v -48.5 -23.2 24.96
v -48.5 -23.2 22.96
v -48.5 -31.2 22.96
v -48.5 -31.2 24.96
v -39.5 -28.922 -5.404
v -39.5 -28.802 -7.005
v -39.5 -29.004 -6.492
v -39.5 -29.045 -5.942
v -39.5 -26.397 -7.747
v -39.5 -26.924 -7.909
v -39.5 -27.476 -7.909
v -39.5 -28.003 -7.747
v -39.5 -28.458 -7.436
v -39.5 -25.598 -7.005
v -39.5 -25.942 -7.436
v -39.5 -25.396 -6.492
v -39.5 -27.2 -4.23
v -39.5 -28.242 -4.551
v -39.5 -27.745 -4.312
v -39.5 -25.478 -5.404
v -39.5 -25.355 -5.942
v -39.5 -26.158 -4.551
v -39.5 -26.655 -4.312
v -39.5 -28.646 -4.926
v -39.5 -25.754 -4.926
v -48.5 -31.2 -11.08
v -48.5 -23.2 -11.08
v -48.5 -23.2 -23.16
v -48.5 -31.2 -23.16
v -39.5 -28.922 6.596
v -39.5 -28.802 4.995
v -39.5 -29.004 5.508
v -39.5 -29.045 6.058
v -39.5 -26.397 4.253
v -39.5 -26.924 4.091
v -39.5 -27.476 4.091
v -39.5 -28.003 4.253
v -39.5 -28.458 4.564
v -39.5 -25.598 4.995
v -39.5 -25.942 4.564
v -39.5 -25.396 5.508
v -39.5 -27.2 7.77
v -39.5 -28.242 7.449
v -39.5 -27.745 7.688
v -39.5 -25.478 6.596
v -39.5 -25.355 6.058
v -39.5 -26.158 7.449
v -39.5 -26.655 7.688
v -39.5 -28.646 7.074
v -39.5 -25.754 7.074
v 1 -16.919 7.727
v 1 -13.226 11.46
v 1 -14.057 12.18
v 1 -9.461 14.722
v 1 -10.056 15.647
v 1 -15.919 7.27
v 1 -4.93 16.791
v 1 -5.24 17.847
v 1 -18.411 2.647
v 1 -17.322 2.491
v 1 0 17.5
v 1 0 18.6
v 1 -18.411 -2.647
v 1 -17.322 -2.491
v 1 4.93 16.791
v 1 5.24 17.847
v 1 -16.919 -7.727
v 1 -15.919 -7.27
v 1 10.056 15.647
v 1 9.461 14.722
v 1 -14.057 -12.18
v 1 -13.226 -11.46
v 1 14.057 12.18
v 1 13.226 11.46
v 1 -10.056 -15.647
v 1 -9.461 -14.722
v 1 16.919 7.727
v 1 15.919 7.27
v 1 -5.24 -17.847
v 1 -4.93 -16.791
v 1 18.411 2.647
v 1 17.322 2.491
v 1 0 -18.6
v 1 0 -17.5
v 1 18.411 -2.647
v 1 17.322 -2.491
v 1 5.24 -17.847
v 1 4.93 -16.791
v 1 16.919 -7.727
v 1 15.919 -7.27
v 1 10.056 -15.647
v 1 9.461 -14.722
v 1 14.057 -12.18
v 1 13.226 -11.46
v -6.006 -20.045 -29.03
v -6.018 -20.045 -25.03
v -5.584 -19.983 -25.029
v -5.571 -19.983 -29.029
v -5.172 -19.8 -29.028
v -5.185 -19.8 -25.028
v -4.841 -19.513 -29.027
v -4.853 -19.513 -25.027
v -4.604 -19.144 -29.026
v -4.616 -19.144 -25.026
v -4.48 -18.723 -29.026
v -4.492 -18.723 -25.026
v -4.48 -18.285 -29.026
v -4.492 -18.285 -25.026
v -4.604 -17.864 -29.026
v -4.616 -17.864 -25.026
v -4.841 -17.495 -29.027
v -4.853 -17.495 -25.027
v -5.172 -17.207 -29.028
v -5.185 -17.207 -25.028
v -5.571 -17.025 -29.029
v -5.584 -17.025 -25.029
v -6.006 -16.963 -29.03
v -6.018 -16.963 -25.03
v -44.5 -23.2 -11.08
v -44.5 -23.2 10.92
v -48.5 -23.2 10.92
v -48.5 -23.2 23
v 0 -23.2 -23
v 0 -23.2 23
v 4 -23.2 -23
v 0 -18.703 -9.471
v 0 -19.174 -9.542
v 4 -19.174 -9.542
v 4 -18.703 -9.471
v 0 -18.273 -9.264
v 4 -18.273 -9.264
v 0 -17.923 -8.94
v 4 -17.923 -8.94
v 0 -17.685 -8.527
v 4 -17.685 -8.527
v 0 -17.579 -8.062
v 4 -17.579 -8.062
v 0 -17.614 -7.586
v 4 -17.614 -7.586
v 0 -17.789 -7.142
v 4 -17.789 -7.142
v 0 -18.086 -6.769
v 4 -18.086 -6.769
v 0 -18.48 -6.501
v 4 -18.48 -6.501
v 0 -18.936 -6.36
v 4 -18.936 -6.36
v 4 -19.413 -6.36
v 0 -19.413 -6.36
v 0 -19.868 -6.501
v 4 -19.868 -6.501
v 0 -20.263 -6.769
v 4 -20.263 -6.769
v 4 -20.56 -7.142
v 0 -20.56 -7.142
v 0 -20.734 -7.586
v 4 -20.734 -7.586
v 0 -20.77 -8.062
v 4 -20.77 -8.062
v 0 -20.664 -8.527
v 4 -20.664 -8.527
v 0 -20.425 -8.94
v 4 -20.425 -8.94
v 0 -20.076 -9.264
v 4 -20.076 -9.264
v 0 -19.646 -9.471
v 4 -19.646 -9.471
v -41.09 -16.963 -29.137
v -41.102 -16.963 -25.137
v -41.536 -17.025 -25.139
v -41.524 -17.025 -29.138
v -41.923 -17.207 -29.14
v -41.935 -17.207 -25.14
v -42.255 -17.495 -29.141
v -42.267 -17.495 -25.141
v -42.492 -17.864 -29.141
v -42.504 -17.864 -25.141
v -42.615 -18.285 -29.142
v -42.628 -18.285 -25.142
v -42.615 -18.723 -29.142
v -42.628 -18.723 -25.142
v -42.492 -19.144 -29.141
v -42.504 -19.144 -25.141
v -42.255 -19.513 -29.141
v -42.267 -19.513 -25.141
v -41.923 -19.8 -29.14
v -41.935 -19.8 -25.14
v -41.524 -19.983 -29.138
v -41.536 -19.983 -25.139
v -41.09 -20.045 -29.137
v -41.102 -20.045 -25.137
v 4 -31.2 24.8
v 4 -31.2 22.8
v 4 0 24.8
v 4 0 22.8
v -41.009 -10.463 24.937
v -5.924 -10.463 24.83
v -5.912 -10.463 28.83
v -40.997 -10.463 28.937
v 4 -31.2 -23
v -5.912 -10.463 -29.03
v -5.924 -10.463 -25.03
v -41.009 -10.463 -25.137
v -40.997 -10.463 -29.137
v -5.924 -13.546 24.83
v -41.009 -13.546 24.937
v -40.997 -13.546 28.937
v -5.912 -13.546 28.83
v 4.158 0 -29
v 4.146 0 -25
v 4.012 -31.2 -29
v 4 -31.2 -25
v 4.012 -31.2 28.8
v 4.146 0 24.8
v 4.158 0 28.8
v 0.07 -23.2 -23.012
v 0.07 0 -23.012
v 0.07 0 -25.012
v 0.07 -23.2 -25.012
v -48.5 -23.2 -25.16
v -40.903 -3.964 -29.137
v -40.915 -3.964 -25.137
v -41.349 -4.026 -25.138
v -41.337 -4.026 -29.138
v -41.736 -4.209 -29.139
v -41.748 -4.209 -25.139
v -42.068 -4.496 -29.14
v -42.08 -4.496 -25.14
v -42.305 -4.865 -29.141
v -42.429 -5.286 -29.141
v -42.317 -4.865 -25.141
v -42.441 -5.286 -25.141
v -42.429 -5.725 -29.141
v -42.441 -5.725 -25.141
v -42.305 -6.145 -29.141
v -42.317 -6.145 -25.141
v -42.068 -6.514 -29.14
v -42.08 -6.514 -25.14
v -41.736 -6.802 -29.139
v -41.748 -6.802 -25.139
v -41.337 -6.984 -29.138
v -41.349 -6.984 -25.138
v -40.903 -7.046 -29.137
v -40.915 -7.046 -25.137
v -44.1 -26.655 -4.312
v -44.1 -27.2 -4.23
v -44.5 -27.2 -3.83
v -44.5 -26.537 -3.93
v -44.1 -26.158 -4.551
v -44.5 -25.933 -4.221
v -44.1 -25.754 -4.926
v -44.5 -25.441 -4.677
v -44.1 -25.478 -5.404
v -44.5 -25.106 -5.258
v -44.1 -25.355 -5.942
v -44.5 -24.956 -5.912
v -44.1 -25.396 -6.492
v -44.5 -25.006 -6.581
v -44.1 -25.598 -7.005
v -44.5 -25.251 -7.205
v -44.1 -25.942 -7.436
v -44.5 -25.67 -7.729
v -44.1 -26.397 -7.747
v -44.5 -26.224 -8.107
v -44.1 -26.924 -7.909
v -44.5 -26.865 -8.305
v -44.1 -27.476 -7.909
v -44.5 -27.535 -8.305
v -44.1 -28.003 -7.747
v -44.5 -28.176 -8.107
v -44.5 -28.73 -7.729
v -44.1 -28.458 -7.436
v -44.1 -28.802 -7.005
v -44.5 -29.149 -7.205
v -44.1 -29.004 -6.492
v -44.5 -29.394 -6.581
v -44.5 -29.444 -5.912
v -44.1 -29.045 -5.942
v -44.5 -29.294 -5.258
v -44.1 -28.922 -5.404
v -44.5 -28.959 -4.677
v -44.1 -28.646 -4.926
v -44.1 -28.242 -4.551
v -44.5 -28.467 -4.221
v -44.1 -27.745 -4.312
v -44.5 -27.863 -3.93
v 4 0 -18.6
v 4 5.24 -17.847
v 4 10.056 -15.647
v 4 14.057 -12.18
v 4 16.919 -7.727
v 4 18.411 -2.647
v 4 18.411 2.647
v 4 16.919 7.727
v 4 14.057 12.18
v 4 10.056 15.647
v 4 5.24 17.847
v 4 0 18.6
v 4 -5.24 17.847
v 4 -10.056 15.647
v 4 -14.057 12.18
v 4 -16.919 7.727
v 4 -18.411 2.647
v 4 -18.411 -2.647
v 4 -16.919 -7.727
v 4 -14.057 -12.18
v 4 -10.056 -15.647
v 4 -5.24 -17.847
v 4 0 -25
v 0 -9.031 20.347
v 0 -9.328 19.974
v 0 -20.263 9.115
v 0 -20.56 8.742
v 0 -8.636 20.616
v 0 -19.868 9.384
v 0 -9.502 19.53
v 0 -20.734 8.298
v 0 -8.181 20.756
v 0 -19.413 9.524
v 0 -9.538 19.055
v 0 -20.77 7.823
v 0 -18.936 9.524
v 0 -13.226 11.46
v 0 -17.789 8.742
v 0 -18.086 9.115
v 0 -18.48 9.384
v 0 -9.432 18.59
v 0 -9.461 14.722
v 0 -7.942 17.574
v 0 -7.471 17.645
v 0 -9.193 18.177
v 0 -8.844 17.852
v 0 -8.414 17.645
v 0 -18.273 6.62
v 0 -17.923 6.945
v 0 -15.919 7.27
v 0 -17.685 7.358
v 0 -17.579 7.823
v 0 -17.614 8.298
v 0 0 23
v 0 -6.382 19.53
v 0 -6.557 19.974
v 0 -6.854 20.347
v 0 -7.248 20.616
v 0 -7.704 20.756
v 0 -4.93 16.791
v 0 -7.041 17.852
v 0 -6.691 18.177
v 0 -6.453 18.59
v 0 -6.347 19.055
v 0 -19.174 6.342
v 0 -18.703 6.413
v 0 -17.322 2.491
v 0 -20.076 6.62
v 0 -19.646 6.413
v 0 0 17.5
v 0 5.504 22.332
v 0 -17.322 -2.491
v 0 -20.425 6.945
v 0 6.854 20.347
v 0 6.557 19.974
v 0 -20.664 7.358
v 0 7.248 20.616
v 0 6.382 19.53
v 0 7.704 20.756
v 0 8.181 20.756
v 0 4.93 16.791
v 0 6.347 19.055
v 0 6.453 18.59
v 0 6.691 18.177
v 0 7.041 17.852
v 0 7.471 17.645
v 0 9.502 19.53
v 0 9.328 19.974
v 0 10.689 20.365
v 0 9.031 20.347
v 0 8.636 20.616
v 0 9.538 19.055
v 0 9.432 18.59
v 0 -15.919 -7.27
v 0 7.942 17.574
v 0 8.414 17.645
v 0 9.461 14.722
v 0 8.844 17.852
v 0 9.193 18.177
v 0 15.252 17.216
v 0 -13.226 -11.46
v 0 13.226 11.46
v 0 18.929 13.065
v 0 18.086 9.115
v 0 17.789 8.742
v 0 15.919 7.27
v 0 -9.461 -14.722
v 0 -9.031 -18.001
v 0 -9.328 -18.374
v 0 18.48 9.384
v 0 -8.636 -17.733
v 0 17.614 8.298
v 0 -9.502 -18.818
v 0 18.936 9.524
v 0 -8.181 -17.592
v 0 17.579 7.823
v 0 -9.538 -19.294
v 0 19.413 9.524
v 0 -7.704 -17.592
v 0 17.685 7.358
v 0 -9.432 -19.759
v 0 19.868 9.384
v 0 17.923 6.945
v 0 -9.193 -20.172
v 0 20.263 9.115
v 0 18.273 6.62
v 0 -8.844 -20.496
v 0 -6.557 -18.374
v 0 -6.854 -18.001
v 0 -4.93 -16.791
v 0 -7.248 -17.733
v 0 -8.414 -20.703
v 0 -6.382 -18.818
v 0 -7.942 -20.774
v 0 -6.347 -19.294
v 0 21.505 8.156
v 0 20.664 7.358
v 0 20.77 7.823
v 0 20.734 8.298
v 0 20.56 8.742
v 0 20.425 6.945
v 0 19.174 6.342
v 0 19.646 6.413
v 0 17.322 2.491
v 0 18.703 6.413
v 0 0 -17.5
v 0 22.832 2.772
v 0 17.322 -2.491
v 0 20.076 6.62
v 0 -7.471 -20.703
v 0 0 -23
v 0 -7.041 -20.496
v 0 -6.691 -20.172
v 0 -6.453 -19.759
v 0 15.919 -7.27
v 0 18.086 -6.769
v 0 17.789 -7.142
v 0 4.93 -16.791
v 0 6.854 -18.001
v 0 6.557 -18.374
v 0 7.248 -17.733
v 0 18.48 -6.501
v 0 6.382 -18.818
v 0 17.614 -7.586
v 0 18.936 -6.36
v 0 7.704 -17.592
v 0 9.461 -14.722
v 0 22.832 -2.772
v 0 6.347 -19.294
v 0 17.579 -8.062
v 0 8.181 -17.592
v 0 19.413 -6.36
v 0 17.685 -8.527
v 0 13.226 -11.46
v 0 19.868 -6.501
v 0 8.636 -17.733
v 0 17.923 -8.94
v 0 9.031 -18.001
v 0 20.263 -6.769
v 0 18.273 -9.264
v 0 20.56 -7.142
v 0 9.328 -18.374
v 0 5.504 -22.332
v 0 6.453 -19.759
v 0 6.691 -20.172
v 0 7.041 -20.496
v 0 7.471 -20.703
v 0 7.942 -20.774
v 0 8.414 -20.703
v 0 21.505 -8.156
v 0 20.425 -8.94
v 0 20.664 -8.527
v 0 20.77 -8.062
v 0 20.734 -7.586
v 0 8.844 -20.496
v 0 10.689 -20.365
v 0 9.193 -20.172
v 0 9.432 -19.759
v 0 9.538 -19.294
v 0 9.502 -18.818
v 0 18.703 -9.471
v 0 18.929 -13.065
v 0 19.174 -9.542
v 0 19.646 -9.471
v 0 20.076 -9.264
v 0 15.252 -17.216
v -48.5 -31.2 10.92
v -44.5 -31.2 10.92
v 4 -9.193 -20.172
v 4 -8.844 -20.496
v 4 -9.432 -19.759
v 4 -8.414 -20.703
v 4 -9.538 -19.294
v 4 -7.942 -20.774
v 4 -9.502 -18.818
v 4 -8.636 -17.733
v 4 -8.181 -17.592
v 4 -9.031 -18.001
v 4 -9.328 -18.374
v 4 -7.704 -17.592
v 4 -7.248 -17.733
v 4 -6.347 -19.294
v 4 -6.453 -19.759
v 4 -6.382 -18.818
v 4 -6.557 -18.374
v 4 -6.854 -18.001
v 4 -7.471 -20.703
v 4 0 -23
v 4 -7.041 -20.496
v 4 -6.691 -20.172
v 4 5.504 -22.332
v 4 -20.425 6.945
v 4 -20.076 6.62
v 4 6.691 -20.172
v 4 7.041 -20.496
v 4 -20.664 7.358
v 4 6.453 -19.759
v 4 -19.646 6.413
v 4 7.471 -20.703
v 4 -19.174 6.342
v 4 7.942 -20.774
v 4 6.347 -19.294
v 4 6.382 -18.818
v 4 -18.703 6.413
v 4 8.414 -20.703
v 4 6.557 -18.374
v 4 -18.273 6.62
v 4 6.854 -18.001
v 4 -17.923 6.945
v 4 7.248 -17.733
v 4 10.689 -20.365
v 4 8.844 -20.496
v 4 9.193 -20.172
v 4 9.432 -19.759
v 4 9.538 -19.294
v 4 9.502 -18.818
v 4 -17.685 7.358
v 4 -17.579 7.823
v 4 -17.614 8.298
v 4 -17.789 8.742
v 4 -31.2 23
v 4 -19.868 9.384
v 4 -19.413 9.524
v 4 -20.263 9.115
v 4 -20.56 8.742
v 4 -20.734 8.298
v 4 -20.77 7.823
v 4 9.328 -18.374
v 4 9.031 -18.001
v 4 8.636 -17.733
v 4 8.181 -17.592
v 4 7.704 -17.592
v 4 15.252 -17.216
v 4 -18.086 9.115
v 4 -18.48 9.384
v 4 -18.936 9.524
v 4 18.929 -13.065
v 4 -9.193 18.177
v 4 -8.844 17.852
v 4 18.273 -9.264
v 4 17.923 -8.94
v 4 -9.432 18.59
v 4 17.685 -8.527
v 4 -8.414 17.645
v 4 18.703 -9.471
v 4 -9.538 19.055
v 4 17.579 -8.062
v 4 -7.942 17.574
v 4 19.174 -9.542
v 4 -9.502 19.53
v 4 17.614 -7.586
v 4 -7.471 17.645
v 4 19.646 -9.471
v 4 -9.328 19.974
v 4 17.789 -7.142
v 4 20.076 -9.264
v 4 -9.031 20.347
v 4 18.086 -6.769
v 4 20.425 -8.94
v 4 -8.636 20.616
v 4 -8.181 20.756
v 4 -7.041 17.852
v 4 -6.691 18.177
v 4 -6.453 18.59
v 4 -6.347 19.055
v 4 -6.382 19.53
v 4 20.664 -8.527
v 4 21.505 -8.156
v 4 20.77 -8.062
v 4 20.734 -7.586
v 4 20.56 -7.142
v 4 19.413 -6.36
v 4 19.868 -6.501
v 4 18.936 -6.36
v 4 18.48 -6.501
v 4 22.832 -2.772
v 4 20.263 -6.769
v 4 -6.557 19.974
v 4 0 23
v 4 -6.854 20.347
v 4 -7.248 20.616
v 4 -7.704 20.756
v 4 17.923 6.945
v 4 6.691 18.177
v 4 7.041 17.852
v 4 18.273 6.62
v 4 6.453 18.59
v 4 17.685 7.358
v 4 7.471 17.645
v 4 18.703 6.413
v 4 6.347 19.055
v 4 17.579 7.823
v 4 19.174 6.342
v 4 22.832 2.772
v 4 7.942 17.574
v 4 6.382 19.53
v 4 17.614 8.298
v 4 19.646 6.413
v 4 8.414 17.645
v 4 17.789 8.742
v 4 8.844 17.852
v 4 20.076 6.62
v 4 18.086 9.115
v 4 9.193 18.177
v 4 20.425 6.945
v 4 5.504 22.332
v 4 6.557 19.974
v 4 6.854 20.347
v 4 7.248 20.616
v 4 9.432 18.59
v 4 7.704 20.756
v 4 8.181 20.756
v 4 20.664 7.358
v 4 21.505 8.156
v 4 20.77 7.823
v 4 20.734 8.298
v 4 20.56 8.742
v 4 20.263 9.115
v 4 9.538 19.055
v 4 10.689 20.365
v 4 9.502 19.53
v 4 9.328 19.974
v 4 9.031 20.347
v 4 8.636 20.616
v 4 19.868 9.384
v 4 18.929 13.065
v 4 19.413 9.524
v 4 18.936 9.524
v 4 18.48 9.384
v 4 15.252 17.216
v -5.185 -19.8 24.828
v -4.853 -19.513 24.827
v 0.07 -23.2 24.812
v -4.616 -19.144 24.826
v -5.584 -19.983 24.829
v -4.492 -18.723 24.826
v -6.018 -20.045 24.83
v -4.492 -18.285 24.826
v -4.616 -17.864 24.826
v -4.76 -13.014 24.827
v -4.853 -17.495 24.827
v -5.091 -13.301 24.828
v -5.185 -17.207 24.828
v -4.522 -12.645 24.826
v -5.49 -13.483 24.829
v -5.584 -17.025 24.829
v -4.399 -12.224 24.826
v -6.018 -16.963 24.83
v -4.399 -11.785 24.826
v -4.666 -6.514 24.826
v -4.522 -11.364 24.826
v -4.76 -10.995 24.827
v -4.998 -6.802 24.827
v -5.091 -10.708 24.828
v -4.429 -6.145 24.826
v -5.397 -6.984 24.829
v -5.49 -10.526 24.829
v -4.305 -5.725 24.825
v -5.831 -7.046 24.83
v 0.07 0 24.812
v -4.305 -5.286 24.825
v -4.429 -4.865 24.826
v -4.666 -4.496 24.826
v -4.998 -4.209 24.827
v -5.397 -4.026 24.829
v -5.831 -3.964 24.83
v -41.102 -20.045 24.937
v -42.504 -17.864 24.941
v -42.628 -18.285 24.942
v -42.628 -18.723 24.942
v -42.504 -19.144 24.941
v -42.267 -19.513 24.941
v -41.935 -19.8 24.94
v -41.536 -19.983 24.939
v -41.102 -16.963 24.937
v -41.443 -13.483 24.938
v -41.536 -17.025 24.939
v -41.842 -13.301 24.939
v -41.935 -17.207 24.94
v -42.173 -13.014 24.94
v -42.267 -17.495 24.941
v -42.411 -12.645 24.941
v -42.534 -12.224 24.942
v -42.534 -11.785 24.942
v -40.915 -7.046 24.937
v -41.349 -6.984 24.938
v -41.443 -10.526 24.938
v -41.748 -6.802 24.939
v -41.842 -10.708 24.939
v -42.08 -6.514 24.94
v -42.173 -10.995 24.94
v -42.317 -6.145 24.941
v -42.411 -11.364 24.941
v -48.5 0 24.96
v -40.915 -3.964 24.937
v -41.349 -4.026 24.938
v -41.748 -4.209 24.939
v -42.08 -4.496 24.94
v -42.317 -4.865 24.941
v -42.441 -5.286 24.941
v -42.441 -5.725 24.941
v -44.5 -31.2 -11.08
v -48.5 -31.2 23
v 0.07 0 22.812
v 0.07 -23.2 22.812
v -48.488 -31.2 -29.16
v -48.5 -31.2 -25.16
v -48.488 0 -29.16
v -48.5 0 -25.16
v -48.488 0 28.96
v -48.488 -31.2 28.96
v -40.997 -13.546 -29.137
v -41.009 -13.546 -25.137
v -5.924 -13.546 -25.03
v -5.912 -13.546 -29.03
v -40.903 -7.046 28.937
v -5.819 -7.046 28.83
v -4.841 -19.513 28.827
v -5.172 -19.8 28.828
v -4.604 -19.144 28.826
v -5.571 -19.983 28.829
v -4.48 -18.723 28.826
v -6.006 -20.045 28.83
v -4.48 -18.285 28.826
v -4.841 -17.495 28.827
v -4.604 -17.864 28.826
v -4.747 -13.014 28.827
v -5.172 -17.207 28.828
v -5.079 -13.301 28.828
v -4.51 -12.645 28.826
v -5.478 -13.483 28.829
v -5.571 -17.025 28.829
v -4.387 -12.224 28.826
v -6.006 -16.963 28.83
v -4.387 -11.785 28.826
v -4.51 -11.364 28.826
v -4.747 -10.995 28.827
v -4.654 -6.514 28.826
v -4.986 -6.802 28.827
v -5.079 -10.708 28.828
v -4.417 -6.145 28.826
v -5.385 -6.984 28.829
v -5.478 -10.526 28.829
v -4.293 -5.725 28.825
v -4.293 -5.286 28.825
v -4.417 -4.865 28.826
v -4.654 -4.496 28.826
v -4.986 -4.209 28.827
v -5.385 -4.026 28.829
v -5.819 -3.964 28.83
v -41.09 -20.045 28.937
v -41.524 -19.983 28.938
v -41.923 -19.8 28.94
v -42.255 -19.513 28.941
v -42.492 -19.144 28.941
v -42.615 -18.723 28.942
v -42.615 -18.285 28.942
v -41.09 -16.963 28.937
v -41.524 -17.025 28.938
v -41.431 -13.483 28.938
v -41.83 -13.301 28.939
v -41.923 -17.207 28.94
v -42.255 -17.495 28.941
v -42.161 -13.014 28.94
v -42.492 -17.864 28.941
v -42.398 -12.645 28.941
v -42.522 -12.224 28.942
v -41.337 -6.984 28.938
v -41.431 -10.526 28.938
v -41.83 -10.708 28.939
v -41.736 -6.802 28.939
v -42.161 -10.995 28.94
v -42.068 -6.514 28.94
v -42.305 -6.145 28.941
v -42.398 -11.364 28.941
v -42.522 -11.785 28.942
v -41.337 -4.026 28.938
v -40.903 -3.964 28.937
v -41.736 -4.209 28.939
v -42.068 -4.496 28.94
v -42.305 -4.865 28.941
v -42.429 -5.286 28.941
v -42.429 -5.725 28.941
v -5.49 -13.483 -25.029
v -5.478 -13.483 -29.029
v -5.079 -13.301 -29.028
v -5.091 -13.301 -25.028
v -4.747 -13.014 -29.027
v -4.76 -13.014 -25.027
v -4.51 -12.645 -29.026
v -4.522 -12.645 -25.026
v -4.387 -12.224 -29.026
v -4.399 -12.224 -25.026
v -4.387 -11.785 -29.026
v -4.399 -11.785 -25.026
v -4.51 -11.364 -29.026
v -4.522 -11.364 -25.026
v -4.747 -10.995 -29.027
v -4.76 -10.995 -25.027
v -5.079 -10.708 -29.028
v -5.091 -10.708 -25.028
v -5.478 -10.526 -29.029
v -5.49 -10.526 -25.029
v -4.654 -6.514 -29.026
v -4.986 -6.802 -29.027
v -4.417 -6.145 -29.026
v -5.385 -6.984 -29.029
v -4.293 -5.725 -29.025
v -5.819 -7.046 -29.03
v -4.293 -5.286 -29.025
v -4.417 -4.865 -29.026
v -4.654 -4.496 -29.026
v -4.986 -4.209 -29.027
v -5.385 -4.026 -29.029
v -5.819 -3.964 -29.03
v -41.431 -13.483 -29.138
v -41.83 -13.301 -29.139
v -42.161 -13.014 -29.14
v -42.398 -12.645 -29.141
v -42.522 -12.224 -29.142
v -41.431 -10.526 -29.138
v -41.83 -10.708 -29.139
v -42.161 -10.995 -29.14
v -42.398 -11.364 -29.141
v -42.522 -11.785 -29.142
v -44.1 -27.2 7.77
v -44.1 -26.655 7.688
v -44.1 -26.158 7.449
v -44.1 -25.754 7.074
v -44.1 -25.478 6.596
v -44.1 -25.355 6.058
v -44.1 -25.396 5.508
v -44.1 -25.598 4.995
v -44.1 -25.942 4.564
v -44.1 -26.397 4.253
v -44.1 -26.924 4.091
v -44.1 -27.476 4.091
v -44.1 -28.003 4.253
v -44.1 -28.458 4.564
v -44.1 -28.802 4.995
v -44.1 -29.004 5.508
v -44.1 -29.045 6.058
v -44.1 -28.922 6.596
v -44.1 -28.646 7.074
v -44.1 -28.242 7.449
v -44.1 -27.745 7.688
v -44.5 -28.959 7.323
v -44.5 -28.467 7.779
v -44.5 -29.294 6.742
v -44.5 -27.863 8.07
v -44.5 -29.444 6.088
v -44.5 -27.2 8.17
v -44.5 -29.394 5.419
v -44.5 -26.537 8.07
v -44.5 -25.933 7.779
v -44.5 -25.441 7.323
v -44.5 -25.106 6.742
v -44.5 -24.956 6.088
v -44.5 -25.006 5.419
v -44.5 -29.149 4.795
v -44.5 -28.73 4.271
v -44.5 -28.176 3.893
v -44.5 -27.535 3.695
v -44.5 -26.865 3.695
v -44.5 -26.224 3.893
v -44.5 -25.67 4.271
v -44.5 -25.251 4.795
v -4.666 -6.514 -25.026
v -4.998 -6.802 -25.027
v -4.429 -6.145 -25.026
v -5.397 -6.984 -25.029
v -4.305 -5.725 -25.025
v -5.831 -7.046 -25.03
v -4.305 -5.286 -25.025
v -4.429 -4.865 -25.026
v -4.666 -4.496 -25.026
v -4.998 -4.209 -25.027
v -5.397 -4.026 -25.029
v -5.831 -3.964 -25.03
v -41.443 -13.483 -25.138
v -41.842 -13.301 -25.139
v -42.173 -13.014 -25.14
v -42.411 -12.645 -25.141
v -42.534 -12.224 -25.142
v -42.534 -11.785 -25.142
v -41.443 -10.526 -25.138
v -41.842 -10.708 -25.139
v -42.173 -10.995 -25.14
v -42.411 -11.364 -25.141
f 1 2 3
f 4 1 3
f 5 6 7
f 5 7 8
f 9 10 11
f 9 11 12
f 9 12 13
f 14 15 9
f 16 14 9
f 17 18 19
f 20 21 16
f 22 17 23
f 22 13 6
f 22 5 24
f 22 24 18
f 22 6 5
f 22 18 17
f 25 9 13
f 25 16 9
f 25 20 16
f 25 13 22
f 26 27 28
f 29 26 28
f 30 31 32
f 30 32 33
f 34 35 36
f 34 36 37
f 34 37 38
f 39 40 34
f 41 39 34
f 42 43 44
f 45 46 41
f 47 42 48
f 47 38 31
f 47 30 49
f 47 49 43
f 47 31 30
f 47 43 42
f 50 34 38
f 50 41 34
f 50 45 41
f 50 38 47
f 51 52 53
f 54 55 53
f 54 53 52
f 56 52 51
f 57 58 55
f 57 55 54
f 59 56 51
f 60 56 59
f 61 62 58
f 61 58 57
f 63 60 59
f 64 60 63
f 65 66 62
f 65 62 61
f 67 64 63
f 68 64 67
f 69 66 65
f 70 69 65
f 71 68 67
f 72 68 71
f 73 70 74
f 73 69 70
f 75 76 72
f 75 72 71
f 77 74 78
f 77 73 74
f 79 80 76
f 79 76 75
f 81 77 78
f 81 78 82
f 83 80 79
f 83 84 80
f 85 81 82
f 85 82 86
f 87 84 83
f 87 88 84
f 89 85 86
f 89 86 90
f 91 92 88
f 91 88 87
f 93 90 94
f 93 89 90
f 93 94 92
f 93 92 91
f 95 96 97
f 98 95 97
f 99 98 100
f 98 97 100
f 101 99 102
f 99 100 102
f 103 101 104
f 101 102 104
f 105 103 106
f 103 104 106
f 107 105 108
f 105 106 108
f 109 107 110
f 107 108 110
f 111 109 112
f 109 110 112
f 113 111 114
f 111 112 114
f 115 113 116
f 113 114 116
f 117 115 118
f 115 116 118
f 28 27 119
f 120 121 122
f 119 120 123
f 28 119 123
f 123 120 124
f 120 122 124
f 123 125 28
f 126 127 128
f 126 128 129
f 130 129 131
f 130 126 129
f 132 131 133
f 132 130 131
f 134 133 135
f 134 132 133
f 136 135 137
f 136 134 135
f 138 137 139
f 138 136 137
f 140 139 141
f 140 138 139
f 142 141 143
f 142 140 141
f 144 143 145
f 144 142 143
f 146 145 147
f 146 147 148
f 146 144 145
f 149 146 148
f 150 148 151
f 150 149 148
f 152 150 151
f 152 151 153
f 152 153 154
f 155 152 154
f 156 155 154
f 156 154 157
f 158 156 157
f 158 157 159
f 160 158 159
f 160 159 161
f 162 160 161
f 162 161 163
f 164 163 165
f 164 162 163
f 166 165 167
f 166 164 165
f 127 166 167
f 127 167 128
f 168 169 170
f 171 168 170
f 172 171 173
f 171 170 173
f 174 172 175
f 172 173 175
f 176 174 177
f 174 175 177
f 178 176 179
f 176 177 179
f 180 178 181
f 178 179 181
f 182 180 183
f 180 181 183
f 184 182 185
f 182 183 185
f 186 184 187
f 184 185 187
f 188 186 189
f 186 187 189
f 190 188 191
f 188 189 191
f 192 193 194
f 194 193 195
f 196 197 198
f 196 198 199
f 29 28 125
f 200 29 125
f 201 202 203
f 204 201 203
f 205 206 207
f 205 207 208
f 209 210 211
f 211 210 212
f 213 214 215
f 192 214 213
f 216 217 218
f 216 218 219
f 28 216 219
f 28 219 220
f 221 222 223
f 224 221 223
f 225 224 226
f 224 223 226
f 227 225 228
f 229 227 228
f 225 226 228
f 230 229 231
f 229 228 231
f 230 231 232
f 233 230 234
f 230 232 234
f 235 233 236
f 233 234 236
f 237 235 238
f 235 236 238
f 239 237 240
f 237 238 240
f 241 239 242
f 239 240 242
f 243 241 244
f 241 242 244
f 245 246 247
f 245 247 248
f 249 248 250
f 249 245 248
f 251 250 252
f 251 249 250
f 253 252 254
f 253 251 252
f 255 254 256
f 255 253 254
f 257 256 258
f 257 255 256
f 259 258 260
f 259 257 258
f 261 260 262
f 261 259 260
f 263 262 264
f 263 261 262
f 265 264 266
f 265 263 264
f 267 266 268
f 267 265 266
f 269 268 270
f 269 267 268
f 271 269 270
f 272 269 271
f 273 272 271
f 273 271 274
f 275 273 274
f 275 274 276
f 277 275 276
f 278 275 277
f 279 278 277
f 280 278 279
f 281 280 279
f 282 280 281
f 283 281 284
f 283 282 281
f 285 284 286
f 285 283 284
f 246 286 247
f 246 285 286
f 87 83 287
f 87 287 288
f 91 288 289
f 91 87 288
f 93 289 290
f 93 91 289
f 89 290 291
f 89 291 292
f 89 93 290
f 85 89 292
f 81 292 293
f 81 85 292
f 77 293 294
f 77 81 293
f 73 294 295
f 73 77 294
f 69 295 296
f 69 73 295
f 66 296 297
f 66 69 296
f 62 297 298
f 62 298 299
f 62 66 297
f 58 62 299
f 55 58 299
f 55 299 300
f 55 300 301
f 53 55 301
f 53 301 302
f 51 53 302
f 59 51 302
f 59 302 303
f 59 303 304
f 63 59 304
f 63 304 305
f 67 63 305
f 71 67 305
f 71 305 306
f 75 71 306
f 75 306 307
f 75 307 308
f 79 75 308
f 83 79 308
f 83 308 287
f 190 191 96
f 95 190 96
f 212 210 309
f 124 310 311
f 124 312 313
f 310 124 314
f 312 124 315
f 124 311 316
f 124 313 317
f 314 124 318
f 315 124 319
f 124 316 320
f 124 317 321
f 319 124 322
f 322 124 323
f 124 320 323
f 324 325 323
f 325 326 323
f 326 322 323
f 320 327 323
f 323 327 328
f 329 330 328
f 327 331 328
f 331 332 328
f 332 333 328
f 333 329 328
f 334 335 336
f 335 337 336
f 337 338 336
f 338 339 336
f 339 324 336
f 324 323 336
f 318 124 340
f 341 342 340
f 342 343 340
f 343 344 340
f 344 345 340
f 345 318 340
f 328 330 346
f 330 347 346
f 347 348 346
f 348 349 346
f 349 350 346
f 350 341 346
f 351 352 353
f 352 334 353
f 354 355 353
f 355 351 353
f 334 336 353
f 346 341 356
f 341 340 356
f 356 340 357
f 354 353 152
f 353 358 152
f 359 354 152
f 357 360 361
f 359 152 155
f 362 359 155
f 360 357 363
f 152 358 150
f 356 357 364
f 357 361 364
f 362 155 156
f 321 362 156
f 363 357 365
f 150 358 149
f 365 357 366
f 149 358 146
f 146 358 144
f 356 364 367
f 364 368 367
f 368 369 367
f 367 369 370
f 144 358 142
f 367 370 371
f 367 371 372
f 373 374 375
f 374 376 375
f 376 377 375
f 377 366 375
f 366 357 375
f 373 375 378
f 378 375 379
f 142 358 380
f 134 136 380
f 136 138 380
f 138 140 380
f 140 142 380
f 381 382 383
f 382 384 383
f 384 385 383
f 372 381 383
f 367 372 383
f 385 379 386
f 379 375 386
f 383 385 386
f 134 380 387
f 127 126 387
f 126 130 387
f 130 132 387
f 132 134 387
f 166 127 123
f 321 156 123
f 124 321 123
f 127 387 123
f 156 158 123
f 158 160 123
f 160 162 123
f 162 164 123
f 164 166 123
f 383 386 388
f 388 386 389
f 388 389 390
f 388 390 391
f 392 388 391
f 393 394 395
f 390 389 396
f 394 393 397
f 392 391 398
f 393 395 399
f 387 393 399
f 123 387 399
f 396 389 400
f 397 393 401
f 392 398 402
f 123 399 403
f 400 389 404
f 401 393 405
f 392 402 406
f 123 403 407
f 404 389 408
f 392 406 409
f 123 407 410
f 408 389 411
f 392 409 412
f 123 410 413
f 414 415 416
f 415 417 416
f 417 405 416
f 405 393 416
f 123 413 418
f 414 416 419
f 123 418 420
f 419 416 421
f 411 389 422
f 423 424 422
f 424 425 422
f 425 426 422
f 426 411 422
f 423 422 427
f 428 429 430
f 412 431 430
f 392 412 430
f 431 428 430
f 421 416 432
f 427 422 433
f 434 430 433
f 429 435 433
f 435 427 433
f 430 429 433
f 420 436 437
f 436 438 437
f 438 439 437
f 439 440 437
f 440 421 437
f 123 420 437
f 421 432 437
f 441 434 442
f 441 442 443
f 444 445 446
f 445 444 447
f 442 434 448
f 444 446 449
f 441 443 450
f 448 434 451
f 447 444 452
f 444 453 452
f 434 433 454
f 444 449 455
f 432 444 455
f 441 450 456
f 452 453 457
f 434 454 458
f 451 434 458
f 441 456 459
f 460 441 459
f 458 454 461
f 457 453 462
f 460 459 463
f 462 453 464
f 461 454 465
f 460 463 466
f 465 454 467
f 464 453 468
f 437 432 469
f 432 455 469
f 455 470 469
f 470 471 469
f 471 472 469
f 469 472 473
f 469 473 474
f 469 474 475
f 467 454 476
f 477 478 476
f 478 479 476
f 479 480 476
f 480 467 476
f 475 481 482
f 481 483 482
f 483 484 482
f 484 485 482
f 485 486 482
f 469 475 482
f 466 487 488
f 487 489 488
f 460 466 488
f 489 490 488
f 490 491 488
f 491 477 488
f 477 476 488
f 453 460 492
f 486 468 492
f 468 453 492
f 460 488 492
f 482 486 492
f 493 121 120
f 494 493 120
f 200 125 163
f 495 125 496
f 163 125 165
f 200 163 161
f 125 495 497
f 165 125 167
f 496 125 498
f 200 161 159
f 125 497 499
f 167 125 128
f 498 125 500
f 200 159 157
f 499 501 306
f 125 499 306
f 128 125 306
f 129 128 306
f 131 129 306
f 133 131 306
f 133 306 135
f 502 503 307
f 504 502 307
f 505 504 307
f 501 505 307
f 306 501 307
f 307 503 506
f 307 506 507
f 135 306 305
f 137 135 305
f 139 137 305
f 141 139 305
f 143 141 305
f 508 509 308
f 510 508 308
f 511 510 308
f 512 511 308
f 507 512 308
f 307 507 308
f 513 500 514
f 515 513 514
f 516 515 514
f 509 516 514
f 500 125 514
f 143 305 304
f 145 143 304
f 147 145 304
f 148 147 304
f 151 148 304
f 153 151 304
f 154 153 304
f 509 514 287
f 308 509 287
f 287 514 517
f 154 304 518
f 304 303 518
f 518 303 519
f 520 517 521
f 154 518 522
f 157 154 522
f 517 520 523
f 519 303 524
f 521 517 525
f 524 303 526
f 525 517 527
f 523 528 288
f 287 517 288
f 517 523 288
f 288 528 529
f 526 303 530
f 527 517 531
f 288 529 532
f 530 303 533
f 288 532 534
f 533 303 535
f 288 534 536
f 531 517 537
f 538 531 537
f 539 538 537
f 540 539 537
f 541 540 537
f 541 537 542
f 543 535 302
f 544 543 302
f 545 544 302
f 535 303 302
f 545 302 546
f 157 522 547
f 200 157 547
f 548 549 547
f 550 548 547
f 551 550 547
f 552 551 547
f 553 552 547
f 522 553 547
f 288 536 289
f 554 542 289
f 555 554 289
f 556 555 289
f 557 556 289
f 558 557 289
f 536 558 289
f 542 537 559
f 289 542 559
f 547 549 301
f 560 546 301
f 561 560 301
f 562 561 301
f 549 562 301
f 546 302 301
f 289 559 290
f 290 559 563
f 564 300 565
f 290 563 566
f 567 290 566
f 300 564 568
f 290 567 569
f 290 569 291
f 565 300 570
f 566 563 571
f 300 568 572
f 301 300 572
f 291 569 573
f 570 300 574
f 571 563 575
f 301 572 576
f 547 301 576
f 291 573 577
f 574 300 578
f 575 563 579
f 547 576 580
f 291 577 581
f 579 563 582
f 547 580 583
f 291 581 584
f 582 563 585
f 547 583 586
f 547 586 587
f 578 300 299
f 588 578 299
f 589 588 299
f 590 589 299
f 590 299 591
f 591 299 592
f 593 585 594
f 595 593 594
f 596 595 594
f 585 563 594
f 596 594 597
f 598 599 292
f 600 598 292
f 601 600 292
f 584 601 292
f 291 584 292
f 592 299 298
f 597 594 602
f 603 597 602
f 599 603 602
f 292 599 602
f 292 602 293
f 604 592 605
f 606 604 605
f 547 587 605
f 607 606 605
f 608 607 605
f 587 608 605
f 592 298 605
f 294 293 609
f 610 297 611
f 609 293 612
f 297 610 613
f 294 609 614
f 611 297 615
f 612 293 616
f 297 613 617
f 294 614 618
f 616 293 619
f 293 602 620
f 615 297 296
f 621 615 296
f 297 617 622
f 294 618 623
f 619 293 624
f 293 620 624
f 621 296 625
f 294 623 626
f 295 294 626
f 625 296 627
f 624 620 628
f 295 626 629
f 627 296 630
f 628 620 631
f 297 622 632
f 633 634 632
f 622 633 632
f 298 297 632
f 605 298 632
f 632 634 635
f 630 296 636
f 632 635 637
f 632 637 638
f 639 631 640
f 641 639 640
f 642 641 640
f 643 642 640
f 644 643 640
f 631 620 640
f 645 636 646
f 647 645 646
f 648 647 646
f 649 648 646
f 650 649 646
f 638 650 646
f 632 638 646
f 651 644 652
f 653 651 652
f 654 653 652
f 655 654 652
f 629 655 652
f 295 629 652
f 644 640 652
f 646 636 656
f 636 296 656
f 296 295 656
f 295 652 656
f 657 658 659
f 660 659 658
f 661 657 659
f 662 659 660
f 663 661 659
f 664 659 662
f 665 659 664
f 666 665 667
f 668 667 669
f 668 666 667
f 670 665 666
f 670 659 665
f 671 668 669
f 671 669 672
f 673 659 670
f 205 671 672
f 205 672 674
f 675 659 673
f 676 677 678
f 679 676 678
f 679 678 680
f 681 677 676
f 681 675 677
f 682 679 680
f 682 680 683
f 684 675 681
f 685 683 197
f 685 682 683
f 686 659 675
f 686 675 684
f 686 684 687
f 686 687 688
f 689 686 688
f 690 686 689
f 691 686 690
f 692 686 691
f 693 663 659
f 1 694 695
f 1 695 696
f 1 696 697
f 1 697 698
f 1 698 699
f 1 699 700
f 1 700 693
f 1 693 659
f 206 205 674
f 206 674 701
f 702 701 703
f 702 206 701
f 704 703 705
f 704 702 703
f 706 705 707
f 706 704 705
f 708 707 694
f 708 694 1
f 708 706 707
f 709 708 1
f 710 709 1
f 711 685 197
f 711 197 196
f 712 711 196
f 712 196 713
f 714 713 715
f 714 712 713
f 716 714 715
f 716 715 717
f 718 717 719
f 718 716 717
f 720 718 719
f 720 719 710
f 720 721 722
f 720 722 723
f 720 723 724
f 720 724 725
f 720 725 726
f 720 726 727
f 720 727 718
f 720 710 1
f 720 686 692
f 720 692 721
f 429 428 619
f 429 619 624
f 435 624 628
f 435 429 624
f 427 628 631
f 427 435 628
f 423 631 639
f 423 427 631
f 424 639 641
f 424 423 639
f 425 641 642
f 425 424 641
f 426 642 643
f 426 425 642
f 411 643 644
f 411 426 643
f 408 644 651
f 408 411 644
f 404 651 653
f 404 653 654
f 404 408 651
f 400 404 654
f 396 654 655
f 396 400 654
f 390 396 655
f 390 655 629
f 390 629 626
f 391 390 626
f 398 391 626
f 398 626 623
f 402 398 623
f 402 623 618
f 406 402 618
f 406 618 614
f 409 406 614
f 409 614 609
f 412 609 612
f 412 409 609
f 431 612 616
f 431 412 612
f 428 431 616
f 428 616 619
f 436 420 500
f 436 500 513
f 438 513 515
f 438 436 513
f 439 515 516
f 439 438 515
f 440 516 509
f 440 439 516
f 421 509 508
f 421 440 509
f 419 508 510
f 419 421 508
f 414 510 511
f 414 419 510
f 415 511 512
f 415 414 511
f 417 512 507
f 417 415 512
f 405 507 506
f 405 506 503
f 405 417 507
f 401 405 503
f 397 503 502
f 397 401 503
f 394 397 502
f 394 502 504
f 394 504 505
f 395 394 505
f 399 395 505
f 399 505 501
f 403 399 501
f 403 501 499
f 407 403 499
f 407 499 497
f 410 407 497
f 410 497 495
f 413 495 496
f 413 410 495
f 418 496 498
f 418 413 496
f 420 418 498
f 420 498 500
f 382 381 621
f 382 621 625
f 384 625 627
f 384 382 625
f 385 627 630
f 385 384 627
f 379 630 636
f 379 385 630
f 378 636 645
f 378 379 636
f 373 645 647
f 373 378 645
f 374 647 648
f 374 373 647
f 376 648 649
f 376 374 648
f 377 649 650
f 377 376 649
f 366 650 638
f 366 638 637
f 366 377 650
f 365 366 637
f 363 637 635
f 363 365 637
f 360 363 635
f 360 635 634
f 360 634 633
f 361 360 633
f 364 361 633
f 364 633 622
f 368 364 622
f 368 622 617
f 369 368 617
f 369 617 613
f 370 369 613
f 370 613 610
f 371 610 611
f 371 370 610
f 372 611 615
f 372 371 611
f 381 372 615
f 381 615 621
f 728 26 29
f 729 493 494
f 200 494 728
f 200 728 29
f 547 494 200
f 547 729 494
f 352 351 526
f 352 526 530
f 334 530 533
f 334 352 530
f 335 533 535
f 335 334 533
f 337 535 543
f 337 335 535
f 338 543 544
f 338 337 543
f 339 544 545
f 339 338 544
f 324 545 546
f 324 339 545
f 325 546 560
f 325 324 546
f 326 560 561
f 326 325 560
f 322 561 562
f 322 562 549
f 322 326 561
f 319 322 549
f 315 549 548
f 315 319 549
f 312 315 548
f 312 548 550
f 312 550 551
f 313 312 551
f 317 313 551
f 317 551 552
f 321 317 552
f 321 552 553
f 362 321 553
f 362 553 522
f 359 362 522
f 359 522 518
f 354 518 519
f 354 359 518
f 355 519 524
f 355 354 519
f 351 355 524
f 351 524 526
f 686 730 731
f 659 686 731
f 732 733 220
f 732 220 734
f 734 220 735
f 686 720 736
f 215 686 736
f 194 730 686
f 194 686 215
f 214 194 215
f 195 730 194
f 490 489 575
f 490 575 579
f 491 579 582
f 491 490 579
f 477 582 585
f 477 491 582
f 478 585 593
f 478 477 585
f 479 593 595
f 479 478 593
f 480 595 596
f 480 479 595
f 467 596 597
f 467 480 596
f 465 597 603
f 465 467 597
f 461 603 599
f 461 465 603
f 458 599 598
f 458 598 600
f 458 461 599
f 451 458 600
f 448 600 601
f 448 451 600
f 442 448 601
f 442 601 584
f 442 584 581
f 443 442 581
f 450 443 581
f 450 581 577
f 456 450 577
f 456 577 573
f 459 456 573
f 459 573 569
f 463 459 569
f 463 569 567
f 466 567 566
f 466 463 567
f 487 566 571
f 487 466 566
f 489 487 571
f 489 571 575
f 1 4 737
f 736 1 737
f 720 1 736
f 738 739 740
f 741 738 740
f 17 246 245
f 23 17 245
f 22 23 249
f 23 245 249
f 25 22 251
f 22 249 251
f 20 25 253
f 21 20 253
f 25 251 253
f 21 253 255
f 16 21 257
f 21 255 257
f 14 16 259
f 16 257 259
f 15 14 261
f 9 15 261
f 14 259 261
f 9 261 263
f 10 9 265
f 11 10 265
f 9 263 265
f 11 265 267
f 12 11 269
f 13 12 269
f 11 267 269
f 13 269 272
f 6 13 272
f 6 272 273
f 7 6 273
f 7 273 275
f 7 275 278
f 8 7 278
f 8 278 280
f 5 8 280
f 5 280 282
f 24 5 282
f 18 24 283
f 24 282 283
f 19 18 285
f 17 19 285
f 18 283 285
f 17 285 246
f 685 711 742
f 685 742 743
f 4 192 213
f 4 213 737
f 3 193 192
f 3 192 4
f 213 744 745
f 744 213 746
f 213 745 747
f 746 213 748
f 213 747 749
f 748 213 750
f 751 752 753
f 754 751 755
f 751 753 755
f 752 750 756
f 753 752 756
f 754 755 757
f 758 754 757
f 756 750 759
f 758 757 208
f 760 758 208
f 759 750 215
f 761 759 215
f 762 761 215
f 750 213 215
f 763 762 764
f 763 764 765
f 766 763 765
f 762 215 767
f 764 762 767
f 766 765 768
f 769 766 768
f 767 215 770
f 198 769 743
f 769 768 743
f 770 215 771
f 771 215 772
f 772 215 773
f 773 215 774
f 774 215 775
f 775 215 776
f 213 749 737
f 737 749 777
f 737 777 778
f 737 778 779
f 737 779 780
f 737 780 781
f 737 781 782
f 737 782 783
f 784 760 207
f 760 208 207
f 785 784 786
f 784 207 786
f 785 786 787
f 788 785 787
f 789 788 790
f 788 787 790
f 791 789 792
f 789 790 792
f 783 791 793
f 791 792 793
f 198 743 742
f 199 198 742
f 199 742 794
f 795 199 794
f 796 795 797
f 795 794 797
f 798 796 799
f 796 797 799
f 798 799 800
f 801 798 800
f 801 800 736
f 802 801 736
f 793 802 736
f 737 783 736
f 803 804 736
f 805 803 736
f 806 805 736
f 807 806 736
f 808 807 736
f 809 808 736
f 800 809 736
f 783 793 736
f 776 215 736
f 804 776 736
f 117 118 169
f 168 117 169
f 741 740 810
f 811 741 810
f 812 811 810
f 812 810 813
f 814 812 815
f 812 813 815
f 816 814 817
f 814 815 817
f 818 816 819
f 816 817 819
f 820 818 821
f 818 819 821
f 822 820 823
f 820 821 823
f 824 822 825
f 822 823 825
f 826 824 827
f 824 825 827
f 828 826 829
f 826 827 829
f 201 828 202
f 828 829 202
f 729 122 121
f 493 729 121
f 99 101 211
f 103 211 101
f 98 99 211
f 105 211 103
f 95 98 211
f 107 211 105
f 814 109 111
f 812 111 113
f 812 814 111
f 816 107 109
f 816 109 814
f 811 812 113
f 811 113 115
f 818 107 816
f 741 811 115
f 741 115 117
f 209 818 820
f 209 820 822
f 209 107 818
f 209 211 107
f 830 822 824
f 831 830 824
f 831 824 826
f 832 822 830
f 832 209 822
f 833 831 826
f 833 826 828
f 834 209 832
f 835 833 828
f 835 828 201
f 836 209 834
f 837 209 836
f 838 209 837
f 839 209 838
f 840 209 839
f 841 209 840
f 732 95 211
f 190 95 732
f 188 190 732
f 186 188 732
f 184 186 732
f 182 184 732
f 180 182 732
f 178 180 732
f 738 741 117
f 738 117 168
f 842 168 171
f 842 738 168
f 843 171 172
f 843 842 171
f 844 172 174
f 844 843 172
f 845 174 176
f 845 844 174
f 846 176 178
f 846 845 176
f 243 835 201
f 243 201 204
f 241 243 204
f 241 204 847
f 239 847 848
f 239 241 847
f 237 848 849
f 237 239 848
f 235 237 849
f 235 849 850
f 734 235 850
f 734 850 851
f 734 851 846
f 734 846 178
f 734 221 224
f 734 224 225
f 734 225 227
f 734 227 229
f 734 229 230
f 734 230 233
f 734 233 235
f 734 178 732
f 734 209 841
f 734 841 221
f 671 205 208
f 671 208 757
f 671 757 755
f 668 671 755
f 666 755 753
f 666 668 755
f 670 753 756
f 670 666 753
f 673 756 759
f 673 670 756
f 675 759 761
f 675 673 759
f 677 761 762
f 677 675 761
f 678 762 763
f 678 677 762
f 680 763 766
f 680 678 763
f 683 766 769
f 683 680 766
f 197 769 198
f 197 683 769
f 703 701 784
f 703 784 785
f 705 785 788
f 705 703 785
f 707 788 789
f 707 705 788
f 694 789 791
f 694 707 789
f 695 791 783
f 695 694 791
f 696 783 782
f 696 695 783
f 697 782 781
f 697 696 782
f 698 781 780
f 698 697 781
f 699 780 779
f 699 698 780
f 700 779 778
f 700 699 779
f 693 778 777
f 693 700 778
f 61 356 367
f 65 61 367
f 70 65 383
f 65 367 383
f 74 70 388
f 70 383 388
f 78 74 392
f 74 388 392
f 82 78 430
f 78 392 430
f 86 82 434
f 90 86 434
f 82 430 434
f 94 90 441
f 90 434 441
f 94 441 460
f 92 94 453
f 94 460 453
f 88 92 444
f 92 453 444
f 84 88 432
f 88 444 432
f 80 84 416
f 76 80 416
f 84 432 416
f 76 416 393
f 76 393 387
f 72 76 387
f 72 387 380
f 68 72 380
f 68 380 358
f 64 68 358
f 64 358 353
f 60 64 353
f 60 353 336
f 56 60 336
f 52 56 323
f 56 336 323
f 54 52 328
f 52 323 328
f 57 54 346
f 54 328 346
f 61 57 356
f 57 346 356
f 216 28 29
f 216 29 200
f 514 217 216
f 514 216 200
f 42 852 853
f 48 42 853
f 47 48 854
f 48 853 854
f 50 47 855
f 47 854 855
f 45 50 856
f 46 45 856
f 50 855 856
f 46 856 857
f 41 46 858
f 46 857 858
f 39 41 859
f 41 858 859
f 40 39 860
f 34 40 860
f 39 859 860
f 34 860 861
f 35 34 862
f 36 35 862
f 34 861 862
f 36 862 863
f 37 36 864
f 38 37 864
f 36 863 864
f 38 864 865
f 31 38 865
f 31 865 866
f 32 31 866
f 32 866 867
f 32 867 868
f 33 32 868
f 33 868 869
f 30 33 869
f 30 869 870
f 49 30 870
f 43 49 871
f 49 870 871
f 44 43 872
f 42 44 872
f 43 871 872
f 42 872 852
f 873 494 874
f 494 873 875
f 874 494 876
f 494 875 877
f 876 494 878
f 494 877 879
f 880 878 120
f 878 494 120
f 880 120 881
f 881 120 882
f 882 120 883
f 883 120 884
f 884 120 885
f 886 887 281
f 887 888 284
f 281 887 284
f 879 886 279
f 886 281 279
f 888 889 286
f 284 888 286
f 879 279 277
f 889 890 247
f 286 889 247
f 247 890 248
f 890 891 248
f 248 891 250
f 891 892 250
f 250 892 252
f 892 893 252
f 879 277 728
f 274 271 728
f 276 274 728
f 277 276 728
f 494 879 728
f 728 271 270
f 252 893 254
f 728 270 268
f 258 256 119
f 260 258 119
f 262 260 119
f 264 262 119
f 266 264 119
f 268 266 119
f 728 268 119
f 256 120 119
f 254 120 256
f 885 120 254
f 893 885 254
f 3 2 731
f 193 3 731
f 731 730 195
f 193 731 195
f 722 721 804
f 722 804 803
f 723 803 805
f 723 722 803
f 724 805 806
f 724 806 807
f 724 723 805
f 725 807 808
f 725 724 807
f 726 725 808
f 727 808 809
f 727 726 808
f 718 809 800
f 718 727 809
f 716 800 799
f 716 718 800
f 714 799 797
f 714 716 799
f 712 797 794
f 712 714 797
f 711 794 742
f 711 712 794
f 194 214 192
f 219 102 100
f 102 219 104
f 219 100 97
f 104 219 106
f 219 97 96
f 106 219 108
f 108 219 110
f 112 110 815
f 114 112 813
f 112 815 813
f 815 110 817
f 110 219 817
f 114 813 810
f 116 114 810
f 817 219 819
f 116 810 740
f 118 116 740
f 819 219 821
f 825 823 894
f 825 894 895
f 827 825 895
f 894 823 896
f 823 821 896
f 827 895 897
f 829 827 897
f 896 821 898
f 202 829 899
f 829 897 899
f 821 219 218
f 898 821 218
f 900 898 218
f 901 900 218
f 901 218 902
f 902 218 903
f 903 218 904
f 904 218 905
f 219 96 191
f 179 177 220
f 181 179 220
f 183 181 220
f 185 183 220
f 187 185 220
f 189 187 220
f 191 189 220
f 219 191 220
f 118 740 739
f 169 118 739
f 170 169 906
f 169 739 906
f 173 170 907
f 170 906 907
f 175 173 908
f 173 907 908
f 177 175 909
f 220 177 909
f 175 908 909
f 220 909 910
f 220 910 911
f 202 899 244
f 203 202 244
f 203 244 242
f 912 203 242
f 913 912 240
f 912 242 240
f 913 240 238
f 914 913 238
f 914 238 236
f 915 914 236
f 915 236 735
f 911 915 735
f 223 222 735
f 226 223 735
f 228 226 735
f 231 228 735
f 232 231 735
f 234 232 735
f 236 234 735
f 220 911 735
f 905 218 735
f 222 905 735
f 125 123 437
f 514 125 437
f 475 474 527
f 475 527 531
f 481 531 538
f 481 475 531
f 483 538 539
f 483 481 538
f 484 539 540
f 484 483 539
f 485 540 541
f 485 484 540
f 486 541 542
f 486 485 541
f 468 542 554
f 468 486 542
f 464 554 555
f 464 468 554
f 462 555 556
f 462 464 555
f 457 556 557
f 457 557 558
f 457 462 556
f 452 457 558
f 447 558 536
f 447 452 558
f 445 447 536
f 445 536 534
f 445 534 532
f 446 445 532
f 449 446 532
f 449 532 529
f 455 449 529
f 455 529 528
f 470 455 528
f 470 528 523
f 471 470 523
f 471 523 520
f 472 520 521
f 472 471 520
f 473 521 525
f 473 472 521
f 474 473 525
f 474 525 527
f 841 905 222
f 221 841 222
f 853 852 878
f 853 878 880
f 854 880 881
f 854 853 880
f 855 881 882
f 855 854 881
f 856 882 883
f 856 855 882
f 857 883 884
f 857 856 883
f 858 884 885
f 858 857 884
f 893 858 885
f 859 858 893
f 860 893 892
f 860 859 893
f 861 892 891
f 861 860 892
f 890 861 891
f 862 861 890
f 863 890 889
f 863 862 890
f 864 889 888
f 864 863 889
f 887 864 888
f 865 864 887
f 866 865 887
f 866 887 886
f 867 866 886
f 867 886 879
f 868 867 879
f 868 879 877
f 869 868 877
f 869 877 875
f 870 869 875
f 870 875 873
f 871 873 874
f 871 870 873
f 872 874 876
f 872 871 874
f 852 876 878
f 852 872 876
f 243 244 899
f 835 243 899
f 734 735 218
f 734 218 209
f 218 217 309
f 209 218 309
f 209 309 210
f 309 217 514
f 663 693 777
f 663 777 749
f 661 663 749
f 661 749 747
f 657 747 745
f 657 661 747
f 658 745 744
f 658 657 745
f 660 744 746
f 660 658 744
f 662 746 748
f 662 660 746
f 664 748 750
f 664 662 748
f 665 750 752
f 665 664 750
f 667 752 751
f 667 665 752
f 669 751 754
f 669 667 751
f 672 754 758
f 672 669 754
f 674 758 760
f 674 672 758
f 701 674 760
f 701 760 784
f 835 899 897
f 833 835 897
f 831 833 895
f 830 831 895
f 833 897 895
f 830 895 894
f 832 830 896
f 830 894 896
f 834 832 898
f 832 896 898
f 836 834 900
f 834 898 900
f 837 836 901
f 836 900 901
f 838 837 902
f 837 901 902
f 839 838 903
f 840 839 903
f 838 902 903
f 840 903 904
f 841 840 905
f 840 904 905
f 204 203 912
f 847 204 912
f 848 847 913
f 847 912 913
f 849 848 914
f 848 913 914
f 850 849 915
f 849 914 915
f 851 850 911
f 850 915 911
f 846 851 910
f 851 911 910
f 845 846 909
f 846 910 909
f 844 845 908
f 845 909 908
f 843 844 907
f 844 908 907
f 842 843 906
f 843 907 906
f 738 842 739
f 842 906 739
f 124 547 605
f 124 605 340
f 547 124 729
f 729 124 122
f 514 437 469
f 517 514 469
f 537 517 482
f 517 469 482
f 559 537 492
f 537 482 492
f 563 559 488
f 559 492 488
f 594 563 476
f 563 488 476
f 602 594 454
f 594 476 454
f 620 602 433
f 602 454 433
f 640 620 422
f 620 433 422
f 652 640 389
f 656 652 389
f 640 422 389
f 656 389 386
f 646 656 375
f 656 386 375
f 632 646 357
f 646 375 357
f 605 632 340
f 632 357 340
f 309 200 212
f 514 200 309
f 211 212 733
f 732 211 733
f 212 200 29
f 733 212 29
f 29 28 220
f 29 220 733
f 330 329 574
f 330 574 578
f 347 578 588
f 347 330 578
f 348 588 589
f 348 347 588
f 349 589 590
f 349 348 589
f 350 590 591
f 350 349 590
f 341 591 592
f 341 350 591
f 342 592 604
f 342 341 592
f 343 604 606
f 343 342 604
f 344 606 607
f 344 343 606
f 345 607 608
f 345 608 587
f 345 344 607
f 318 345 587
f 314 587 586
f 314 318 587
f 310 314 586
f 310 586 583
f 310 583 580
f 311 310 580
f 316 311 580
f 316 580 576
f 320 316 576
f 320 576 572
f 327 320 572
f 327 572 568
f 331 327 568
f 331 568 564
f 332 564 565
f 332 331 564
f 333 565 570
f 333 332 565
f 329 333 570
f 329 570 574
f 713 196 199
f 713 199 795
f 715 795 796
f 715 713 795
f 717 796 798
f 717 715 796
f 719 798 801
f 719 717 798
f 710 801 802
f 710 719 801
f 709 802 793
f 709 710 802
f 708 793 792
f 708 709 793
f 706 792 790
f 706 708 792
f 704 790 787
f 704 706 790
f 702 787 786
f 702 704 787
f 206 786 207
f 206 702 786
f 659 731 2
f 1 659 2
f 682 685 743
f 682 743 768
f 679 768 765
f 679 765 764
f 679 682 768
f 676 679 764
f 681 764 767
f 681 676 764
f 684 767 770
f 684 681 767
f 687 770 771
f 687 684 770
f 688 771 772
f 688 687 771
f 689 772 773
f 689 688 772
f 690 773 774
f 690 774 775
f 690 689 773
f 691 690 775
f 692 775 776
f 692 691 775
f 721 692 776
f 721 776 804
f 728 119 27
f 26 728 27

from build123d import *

# Parameters (mm, degrees)
SKETCH_1_R                = 1.6
SKETCH_1_R_2              = 18.6
EXTRUDE_1_DEPTH           = 4
EXTRUDE_2_DEPTH           = 1
SKETCH_2_W                = 4
SKETCH_2_H                = 46
EXTRUDE_3_DEPTH           = 8
SKETCH_3_R                = 1.85
CUT_EXTRUDE_1_DEPTH       = 5
CHAMFER_2_SIZE            = 0.4
EXTRUDE_7_DEPTH           = 2
EXTRUDE_8_DEPTH           = 4
SKETCH_6_R                = 15
SKETCH_6_R_2              = 10
EXTRUDE_9_DEPTH           = 60
RIB_24_REACH              = 108.905
SKETCH_12_WALL_W          = 236.72683344
SKETCH_12_WALL_H          = 5
PATTERN_CIRCULAR_13_COUNT = 2
RIB_25_REACH              = 108.475
SKETCH_13_WALL_W          = 234.85356175
SKETCH_13_WALL_H          = 5
PATTERN_CIRCULAR_14_COUNT = 2
EXTRUDE_10_DEPTH          = 4
SPLIT_START               = -95.2
SPLIT_BODIES_1_DEPTH      = 64


# Read off the part's stored shape, not the designer's step: 分割1
with BuildPart() as part:
    # 草图1 → 凸台-拉伸1 (new body)
    with BuildSketch(Plane(origin=(0, 0, 0), x_dir=(0, 0, -1), z_dir=(1, 0, 0))):
        with BuildLine():
            ThreePointArc((23, 0), (0, 23), (-23, 0))
            Line((-23, 0), (-23, -23.2))
            Line((-23, -23.2), (23, -23.2))
            Line((23, -23.2), (23, 0))
        make_face()
        with Locations((-7.942246996, -19.174280415)):
            Circle(SKETCH_1_R, mode=Mode.SUBTRACT)
        with Locations((-19.174280415, -7.942246996)):
            Circle(SKETCH_1_R, mode=Mode.SUBTRACT)
        with Locations((7.942246996, -19.174280415)):
            Circle(SKETCH_1_R, mode=Mode.SUBTRACT)
        with Locations((19.174280415, -7.942246996)):
            Circle(SKETCH_1_R, mode=Mode.SUBTRACT)
        with Locations((-19.174280415, 7.942246996)):
            Circle(SKETCH_1_R, mode=Mode.SUBTRACT)
        with Locations((-7.942246996, 19.174280415)):
            Circle(SKETCH_1_R, mode=Mode.SUBTRACT)
        Circle(SKETCH_1_R_2, mode=Mode.SUBTRACT)
        with Locations((19.174280415, 7.942246996)):
            Circle(SKETCH_1_R, mode=Mode.SUBTRACT)
        with Locations((7.942246996, 19.174280415)):
            Circle(SKETCH_1_R, mode=Mode.SUBTRACT)
    extrude(amount=EXTRUDE_1_DEPTH)

    # 草图1<3> → 凸台-拉伸2 (add)
    with BuildSketch(Plane(origin=(0, 0, 0), x_dir=(0, 0, -1), z_dir=(1, 0, 0))):
        with BuildLine():
            ThreePointArc((18.6, 0), (0, 18.6), (-18.6, 0))
            ThreePointArc((-18.6, 0), (0, -18.6), (18.6, 0))
        make_face()
        with BuildLine():
            ThreePointArc((17.5, 0), (0, -17.5), (-17.5, 0))
            ThreePointArc((-17.5, 0), (0, 17.5), (17.5, 0))
        make_face(mode=Mode.SUBTRACT)
    extrude(amount=EXTRUDE_2_DEPTH)

    # 草图2 → 凸台-拉伸3 (add)
    with BuildSketch(Plane.XZ.offset(23.2)):
        Polygon((0, -23), (0, 23), (-48.499757106, 23), (-48.499757106, 10.920150371), (-44.499757106, 10.920150371), (-44.499757106, -11.079849629), (-48.499757106, -11.079849629), (-48.499757106, -23.159699257), (4, -23), align=None)
        with Locations((2, 0)):
            Rectangle(SKETCH_2_W, SKETCH_2_H)
    extrude(amount=EXTRUDE_3_DEPTH)

    # 草图3 → 切除-拉伸1 (cut)
    with BuildSketch(Plane.ZY.offset(44.499757106)):
        with Locations((5.920150371, -27.2)):
            Circle(SKETCH_3_R)
        with Locations((-6.079849629, -27.2)):
            Circle(SKETCH_3_R)
    extrude(amount=-CUT_EXTRUDE_1_DEPTH, mode=Mode.SUBTRACT)

    # 倒角2
    chamfer_2_edges = [part.edges().sort_by_distance(p)[0] for p in [
        (-44.499757106, -27.2, -7.929849629),
        (-44.499757106, -27.2, 4.070150371),
    ]]
    chamfer(chamfer_2_edges, length=CHAMFER_2_SIZE)

    # 草图6 → 凸台-拉伸9 (add)
    with BuildSketch(Plane.XZ.offset(31.2)):
        with Locations(Location((-22.23771099, -0.1, 0), (0, 0, 270))):
            Circle(SKETCH_6_R)
        with Locations(Location((-22.23771099, -0.1, 0), (0, 0, 270))):
            Circle(SKETCH_6_R_2, mode=Mode.SUBTRACT)
    extrude(amount=EXTRUDE_9_DEPTH)

    # 草图12 wall → 筋24 (add, up to next)
    with BuildSketch(Plane(origin=(-5.361401372, -38.595476089, -14.822347737), x_dir=(0.532846585871, 0.707106781177, -0.464838161019), z_dir=(-0.532846585853, 0.707106781196, 0.46483816101)), mode=Mode.PRIVATE) as rib_24_sk1:
        Rectangle(SKETCH_12_WALL_W, SKETCH_12_WALL_H)
    rib_24_tool1 = extrude(rib_24_sk1.sketch, amount=RIB_24_REACH, mode=Mode.PRIVATE) - part.part
    rib_24 = rib_24_tool1.solids().sort_by_distance((-5.361401372, -38.595476089, -14.822347737))[0]
    add(rib_24)

    # 阵列(圆周)13: 筋24 ×2 about axis
    pattern_circular_13_axis = Axis((-22.23771099, -91.2, -0.1), (0, 1, 0))
    for i in range(1, PATTERN_CIRCULAR_13_COUNT):
        add(rib_24.rotate(pattern_circular_13_axis, i * 360 / PATTERN_CIRCULAR_13_COUNT))

    # 草图13 wall → 筋25 (add, up to next)
    with BuildSketch(Plane(origin=(-6.655035456, -38.237231079, 15.482675535), x_dir=(0.500000000026, 0.707106781186, 0.499999999976), z_dir=(-0.499999999999, 0.707106781187, -0.499999999999)), mode=Mode.PRIVATE) as rib_25_sk1:
        Rectangle(SKETCH_13_WALL_W, SKETCH_13_WALL_H)
    rib_25_tool1 = extrude(rib_25_sk1.sketch, amount=RIB_25_REACH, mode=Mode.PRIVATE) - part.part
    rib_25 = rib_25_tool1.solids().sort_by_distance((-6.655035456, -38.237231079, 15.482675535))[0]
    add(rib_25)

    # 阵列(圆周)14: 筋25 ×2 about axis
    pattern_circular_14_axis = Axis((-22.23771099, -91.2, -0.1), (0, 1, 0))
    for i in range(1, PATTERN_CIRCULAR_14_COUNT):
        add(rib_25.rotate(pattern_circular_14_axis, i * 360 / PATTERN_CIRCULAR_14_COUNT))

    # 草图16 → 凸台-拉伸10 (add)
    with BuildSketch(Plane.XZ.offset(91.2)):
        Polygon((-22.249878553, 23), (7.749520178, 22.810063751), (7.749520178, -23.2), (-22.225543428, -23.2), (-52.225543428, -23.2), (-52.225543428, 23), align=None)
    extrude(amount=EXTRUDE_10_DEPTH)

    # Split Bodies 1 outline → Split Bodies 1 (cut)
    with BuildSketch(Plane(origin=(0, 0, 0), x_dir=(1, 0, 0), z_dir=(0, 1, 0)).offset(SPLIT_START)):
        Polygon((-52.225543428, -23), (-22.249878553, -23), (7.749520178, -22.810063751), (7.749520178, 23.2), (-52.225543428, 23.2), align=None)
    extrude(amount=SPLIT_BODIES_1_DEPTH, mode=Mode.SUBTRACT)


with BuildPart() as body_2:
    # 草图4 → 凸台-拉伸7 (new, along a direction that is not the sketch's normal)
    with BuildSketch(Plane(origin=(0.070000173, 0, -23.011954685), x_dir=(-0.9999953734400472, 0, -0.003041890612873783), z_dir=(0.003041890612873783, 0, -0.9999953734400472))):
        Polygon((-3.93001801, 0), (0, 0), (0, -23.2), (48.56998199, -23.2), (48.56998199, -31.2), (-3.93001801, -31.2), align=None)
    extrude(amount=EXTRUDE_7_DEPTH, dir=(0, 0, -1))

    # 草图5 → 凸台-拉伸8 (add)
    with BuildSketch(Plane(origin=(0.076083926, 0, -25.011936179), x_dir=(-0.9999953734400472, 0, -0.0030418906128740326), z_dir=(0.0030418906128740326, 0, -0.9999953734400472))):
        Polygon((-4.069944978, 0), (-3.923934228, -31.2), (48.576065772, -31.2), (48.576065772, 0), align=None)
        with BuildLine():
            Line((5.907026727, -3.964013685), (40.991495952, -3.964013685))
            ThreePointArc((40.991495952, -3.964013685), (42.532674187, -5.50519192), (40.991495952, -7.046370155))
            Line((40.991495952, -7.046370155), (5.907026727, -7.046370155))
            ThreePointArc((5.907026727, -7.046370155), (4.365848493, -5.50519192), (5.907026727, -3.964013685))
        make_face(mode=Mode.SUBTRACT)
        with BuildLine():
            Line((6.000496452, -10.463341605), (41.084965677, -10.463341605))
            ThreePointArc((41.084965677, -10.463341605), (42.626143912, -12.00451984), (41.084965677, -13.545698074))
            Line((41.084965677, -13.545698074), (6.000496452, -13.545698074))
            ThreePointArc((6.000496452, -13.545698074), (4.459318217, -12.00451984), (6.000496452, -10.463341605))
        make_face(mode=Mode.SUBTRACT)
        with BuildLine():
            Line((6.093966177, -16.962669525), (41.178435402, -16.962669525))
            ThreePointArc((41.178435402, -16.962669525), (42.719613636, -18.50384776), (41.178435402, -20.045025994))
            Line((41.178435402, -20.045025994), (6.093966177, -20.045025994))
            ThreePointArc((6.093966177, -20.045025994), (4.552787942, -18.50384776), (6.093966177, -16.962669525))
        make_face(mode=Mode.SUBTRACT)
    extrude(amount=EXTRUDE_8_DEPTH)


with BuildPart() as body_3:
    # 镜向3: mirrored copy
    add(body_2.part.mirror(Plane.XY))


with BuildPart() as body_3_1:
    # Move Body 1: moved
    add(body_3.part.moved(Location((0, 0, -0.2))))


solid = Compound([part.part, body_2.part, body_3_1.part])
